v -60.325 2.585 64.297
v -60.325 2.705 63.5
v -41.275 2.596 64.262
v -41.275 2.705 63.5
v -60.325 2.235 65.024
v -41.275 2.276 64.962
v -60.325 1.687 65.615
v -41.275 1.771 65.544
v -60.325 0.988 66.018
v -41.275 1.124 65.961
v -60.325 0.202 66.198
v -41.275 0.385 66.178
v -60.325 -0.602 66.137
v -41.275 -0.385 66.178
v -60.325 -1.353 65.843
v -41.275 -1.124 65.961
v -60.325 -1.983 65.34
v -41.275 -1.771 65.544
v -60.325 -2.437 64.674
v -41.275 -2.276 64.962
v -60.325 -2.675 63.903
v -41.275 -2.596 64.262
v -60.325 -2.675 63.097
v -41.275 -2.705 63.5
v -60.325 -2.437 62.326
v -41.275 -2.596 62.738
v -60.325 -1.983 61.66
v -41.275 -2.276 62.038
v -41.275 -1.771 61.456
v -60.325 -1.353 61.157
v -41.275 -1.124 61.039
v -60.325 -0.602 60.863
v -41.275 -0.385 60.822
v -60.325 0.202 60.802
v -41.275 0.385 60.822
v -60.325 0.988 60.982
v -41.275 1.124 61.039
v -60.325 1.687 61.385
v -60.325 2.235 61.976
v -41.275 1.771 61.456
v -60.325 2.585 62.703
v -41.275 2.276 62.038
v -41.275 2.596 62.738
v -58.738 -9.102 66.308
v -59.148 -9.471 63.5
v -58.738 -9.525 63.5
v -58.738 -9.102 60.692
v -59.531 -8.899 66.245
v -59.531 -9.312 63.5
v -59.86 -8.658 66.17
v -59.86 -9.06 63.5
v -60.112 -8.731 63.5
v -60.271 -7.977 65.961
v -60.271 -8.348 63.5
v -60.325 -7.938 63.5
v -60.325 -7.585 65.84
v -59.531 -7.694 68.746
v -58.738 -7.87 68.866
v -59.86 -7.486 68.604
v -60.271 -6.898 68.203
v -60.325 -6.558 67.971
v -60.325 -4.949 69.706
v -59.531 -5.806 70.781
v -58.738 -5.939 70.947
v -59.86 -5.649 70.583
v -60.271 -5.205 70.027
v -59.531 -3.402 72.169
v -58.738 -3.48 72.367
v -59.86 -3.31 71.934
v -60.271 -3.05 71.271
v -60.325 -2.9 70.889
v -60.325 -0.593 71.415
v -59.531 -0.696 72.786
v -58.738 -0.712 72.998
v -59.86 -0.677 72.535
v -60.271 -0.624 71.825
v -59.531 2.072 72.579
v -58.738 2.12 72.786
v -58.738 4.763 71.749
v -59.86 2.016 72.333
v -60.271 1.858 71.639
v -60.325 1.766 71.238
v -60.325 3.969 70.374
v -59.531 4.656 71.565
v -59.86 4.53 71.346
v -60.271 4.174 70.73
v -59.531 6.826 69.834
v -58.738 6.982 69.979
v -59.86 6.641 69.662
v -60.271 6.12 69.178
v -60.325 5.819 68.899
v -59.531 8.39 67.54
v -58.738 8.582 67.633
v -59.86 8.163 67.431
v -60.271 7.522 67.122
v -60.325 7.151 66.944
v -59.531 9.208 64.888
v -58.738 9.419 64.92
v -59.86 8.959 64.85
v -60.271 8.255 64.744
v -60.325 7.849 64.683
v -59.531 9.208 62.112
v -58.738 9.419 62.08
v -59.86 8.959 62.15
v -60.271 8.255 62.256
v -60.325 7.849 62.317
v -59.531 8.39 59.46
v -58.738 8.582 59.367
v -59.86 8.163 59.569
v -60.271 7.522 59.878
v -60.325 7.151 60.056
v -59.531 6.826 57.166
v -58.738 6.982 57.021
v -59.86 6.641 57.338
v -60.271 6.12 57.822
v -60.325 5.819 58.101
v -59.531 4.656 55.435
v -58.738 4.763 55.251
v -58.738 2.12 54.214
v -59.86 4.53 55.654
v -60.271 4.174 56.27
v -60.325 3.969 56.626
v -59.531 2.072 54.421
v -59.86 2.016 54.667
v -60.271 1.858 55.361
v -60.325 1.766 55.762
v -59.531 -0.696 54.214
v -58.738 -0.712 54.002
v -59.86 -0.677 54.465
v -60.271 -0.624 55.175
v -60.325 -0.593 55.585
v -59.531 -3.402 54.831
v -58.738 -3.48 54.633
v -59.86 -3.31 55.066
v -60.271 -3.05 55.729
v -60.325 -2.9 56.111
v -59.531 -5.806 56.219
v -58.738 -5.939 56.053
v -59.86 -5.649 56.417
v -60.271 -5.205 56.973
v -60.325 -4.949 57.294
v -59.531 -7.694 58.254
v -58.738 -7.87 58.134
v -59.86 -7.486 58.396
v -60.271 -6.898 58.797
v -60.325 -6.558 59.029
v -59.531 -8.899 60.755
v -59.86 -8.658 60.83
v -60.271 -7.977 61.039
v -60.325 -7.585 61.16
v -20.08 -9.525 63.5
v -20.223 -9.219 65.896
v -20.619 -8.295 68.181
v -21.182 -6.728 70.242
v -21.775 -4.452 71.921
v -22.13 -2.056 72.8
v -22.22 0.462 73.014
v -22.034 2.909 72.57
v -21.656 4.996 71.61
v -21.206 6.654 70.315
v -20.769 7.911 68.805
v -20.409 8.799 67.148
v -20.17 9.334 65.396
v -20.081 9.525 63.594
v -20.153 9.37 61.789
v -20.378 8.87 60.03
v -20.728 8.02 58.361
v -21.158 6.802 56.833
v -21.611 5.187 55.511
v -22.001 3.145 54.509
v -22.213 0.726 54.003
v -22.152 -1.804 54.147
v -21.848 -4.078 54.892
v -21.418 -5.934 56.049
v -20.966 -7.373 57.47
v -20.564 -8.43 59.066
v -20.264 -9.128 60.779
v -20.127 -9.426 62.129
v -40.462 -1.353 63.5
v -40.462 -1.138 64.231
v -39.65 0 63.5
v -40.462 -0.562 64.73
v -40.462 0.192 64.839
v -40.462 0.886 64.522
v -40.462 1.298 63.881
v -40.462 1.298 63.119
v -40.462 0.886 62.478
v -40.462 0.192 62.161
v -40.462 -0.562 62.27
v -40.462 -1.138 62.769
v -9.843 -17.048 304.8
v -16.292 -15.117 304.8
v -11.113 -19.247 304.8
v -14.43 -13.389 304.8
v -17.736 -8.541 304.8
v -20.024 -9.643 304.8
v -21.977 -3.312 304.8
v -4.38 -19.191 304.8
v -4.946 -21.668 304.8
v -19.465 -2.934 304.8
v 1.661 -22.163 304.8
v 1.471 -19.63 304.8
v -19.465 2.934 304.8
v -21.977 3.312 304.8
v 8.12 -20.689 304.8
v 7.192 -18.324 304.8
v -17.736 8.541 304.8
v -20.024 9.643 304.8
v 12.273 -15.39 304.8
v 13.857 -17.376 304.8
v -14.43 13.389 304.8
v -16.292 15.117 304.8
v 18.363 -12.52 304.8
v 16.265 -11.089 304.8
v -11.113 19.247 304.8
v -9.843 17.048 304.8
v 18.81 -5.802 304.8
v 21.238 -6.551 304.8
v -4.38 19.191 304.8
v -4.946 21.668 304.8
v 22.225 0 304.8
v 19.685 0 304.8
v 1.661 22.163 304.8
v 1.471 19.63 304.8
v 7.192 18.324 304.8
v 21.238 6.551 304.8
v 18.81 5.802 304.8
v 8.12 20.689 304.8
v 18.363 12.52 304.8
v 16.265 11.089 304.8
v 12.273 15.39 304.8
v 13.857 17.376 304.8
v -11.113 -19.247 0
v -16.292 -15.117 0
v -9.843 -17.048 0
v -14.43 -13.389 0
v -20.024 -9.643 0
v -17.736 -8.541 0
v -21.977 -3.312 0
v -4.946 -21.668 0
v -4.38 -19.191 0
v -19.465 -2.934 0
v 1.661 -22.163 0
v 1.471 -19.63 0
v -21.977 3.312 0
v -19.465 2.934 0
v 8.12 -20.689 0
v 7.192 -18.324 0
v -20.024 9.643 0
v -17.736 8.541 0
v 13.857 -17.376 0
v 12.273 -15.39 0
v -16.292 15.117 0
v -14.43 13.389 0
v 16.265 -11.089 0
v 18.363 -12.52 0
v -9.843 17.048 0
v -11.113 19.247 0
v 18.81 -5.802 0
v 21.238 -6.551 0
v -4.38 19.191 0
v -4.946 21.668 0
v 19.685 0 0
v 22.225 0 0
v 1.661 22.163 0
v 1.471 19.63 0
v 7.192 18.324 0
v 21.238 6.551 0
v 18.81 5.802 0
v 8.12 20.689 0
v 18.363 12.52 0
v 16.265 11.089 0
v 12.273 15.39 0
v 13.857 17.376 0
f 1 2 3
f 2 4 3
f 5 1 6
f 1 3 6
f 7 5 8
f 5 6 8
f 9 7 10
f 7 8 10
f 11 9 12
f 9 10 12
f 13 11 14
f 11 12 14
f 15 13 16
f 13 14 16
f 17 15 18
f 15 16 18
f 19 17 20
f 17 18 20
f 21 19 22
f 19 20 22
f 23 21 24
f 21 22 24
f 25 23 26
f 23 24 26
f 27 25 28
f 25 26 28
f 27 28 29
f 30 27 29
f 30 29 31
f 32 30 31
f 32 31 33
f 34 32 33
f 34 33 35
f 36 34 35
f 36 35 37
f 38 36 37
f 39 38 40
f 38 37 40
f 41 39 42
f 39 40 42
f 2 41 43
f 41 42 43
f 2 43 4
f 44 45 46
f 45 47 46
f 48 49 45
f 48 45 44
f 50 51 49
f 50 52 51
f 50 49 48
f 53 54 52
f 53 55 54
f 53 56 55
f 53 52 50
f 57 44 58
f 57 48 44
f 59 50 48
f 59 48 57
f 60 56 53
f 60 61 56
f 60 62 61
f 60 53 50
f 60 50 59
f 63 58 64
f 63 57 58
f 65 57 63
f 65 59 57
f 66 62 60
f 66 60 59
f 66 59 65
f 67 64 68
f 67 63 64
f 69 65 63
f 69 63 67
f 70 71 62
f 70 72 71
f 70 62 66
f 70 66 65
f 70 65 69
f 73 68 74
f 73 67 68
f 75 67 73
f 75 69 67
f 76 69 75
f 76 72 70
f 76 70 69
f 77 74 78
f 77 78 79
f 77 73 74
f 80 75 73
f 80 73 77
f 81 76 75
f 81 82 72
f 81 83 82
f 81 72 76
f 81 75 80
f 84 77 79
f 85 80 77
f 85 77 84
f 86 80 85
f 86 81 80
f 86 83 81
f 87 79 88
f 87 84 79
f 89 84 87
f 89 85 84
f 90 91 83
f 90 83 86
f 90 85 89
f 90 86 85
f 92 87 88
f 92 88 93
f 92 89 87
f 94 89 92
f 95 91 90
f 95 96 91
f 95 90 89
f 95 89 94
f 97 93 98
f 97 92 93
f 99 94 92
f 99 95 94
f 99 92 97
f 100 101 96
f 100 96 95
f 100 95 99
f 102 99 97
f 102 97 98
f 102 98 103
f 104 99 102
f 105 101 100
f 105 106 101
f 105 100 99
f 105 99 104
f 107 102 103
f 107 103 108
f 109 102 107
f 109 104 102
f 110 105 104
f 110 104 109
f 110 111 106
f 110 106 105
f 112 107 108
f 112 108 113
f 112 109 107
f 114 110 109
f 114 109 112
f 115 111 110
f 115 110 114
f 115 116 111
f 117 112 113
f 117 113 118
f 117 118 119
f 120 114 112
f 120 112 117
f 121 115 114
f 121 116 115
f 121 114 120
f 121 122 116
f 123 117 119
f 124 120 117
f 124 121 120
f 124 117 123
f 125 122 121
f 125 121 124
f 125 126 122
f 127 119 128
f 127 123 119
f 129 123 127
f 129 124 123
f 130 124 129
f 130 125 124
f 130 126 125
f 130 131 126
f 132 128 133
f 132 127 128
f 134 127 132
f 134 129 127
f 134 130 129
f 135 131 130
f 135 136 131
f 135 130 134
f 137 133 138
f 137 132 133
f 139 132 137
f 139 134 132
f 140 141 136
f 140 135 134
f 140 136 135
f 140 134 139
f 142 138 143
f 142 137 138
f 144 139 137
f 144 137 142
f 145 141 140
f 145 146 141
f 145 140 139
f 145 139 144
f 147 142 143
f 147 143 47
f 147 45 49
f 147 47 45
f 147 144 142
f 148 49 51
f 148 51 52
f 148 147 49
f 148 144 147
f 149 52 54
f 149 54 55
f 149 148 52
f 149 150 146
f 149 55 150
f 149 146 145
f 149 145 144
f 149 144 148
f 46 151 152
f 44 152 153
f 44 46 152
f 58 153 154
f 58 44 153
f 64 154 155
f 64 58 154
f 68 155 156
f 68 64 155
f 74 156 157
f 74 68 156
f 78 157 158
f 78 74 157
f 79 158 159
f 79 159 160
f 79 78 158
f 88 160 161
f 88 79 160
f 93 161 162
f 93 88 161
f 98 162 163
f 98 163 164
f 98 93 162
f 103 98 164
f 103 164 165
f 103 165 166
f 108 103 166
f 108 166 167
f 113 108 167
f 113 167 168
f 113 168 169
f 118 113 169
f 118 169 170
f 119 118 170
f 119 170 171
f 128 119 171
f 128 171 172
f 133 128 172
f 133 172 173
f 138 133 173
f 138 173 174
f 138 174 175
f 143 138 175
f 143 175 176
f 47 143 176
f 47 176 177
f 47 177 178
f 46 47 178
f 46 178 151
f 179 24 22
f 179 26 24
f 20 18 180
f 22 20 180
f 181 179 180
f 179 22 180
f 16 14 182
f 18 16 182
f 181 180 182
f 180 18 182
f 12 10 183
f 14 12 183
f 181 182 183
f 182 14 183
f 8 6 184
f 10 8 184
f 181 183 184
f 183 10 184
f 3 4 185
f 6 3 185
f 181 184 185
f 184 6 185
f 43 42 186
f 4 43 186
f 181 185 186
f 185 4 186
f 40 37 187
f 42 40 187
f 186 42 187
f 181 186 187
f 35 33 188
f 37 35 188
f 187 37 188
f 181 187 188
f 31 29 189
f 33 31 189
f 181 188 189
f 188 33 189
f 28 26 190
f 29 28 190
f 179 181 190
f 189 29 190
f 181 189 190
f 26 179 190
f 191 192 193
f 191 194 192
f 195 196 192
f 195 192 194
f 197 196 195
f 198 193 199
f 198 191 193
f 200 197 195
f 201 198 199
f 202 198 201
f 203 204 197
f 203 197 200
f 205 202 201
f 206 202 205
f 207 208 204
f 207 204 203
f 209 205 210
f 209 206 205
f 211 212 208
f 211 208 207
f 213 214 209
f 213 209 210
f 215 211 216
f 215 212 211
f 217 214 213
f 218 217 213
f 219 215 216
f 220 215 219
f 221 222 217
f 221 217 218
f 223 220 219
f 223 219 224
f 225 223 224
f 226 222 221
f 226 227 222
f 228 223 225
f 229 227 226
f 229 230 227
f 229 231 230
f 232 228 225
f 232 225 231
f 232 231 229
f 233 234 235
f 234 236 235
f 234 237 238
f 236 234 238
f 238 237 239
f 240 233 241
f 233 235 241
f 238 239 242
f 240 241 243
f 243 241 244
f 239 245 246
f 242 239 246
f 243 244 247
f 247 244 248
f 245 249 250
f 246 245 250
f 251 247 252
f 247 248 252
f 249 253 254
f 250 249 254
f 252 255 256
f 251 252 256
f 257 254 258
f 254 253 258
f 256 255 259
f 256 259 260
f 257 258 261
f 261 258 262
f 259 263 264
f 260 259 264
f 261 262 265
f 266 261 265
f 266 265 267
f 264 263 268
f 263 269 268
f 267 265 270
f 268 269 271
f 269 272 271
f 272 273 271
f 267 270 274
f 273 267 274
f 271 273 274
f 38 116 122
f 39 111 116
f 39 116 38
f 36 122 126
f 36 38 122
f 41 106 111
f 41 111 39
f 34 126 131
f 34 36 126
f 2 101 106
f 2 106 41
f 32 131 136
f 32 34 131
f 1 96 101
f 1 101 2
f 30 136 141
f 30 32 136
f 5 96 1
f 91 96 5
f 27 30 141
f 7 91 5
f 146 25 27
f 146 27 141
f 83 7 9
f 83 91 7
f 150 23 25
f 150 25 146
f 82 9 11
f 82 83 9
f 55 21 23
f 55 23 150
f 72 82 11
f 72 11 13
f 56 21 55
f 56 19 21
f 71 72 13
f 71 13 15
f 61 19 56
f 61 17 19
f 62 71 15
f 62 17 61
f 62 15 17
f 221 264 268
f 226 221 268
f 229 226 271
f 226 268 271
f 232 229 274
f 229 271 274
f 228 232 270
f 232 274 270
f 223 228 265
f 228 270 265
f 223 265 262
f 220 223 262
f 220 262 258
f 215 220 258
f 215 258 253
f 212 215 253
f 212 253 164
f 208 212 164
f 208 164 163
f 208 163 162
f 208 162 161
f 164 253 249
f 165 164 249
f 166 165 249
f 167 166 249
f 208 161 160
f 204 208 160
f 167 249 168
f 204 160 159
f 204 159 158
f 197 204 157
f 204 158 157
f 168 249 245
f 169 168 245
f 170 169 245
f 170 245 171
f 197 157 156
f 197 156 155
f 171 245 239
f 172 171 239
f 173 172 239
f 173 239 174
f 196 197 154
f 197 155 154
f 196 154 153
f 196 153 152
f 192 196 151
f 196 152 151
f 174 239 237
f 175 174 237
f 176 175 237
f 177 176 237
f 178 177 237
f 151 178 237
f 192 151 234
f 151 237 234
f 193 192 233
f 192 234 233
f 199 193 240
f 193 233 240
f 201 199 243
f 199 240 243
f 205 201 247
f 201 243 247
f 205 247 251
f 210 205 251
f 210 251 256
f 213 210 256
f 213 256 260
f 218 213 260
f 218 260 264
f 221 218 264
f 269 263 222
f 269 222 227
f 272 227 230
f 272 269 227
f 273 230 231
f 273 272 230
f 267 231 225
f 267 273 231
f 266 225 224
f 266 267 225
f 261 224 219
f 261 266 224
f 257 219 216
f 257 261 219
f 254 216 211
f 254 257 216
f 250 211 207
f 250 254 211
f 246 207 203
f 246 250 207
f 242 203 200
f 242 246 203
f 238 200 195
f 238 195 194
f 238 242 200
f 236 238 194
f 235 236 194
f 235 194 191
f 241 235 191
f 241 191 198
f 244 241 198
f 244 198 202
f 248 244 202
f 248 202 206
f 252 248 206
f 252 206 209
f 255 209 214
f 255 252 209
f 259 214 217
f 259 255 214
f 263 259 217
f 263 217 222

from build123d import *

# Parameters (mm, degrees)
F0_R     = 22.225
F0_R_2   = 19.685
F1_DEPTH = 304.8
F4_R     = 9.525
F7_D     = 5.4102
F7_DEPTH = 19.05
F7_TIP   = 1.6253880605
F8_R     = 1.5875


with BuildPart() as f1:
    # F0 (on Top) → F1 (new body)
    with BuildSketch(Plane.XY):
        Circle(F0_R)
        Circle(F0_R_2, mode=Mode.SUBTRACT)
    extrude(amount=F1_DEPTH)

    # F4 (on line) → F5 (join, up to the next surface of F1)
    with BuildSketch(Plane(origin=(-60.325, 0, 0), x_dir=(0, -1, 0), z_dir=(-1, 0, 0))):
        with Locations((0, 63.5)):
            Circle(F4_R)
    extrude(until=Until.NEXT, dir=(1, 0, 0))

    # F7
    with Locations(Plane(origin=(-60.325, 0, 0), x_dir=(0, -1, 0), z_dir=(-1, 0, 0))):
        with Locations((0, 63.5)):
            Hole(F7_D / 2, depth=F7_DEPTH)
            with Locations((0, 0, -(F7_DEPTH + F7_TIP / 2))):  # 118° drill point
                Cone(0, F7_D / 2, F7_TIP, mode=Mode.SUBTRACT)

    # F8
    f8_edges = [f1.edges().sort_by_distance(p)[0] for p in [
        (-60.325, 9.525, 63.5),
    ]]
    fillet(f8_edges, radius=F8_R)


solid = f1.part
